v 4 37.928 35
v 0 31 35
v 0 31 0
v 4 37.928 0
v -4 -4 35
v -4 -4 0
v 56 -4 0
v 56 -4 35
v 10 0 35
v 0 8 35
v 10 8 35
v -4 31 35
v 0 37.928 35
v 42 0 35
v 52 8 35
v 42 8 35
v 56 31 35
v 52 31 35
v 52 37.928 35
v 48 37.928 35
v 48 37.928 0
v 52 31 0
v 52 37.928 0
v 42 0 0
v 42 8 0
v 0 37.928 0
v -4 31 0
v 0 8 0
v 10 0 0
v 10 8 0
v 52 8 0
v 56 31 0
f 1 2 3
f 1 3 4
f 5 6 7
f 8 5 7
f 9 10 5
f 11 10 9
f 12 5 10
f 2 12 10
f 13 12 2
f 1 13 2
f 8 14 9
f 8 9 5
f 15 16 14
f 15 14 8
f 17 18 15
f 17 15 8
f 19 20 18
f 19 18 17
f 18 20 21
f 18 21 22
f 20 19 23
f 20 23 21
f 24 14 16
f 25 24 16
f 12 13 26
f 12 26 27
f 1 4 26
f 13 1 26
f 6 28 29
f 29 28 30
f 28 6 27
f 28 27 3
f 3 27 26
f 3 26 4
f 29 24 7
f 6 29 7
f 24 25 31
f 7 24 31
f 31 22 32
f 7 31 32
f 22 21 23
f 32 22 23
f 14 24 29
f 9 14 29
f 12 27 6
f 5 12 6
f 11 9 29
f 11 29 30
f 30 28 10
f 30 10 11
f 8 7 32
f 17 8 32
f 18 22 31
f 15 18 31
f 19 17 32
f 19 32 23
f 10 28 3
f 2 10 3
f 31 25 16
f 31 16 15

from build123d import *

# Parameters (mm, degrees)
F0_W     = 4
F0_H     = 4
F0_W_2   = 10
F0_H_2   = 8
F1_DEPTH = 35


with BuildPart() as f1:
    # F0 (on Top) → F1 (new body)
    with BuildSketch(Plane.XY):
        Polygon((-4, 31), (0, 31), (4, 37.928203), (0, 37.928203), align=None)
        Polygon((-4, 0), (0, 0), (0, 8), (0, 31), (-4, 31), align=None)
        with Locations((-2, -2)):
            Rectangle(F0_W, F0_H)
        Polygon((10, 0), (0, 0), (0, -4), (52, -4), (52, 0), (42, 0), align=None)
        with Locations((54, -2)):
            Rectangle(F0_W, F0_H)
        Polygon((52, 8), (52, 0), (56, 0), (56, 31), (52, 31), align=None)
        Polygon((48, 37.928203), (52, 31), (56, 31), (52, 37.928203), align=None)
        with Locations((5, 4)):
            Rectangle(F0_W_2, F0_H_2)
        with Locations((47, 4)):
            Rectangle(F0_W_2, F0_H_2)
    extrude(amount=F1_DEPTH)


solid = f1.part
